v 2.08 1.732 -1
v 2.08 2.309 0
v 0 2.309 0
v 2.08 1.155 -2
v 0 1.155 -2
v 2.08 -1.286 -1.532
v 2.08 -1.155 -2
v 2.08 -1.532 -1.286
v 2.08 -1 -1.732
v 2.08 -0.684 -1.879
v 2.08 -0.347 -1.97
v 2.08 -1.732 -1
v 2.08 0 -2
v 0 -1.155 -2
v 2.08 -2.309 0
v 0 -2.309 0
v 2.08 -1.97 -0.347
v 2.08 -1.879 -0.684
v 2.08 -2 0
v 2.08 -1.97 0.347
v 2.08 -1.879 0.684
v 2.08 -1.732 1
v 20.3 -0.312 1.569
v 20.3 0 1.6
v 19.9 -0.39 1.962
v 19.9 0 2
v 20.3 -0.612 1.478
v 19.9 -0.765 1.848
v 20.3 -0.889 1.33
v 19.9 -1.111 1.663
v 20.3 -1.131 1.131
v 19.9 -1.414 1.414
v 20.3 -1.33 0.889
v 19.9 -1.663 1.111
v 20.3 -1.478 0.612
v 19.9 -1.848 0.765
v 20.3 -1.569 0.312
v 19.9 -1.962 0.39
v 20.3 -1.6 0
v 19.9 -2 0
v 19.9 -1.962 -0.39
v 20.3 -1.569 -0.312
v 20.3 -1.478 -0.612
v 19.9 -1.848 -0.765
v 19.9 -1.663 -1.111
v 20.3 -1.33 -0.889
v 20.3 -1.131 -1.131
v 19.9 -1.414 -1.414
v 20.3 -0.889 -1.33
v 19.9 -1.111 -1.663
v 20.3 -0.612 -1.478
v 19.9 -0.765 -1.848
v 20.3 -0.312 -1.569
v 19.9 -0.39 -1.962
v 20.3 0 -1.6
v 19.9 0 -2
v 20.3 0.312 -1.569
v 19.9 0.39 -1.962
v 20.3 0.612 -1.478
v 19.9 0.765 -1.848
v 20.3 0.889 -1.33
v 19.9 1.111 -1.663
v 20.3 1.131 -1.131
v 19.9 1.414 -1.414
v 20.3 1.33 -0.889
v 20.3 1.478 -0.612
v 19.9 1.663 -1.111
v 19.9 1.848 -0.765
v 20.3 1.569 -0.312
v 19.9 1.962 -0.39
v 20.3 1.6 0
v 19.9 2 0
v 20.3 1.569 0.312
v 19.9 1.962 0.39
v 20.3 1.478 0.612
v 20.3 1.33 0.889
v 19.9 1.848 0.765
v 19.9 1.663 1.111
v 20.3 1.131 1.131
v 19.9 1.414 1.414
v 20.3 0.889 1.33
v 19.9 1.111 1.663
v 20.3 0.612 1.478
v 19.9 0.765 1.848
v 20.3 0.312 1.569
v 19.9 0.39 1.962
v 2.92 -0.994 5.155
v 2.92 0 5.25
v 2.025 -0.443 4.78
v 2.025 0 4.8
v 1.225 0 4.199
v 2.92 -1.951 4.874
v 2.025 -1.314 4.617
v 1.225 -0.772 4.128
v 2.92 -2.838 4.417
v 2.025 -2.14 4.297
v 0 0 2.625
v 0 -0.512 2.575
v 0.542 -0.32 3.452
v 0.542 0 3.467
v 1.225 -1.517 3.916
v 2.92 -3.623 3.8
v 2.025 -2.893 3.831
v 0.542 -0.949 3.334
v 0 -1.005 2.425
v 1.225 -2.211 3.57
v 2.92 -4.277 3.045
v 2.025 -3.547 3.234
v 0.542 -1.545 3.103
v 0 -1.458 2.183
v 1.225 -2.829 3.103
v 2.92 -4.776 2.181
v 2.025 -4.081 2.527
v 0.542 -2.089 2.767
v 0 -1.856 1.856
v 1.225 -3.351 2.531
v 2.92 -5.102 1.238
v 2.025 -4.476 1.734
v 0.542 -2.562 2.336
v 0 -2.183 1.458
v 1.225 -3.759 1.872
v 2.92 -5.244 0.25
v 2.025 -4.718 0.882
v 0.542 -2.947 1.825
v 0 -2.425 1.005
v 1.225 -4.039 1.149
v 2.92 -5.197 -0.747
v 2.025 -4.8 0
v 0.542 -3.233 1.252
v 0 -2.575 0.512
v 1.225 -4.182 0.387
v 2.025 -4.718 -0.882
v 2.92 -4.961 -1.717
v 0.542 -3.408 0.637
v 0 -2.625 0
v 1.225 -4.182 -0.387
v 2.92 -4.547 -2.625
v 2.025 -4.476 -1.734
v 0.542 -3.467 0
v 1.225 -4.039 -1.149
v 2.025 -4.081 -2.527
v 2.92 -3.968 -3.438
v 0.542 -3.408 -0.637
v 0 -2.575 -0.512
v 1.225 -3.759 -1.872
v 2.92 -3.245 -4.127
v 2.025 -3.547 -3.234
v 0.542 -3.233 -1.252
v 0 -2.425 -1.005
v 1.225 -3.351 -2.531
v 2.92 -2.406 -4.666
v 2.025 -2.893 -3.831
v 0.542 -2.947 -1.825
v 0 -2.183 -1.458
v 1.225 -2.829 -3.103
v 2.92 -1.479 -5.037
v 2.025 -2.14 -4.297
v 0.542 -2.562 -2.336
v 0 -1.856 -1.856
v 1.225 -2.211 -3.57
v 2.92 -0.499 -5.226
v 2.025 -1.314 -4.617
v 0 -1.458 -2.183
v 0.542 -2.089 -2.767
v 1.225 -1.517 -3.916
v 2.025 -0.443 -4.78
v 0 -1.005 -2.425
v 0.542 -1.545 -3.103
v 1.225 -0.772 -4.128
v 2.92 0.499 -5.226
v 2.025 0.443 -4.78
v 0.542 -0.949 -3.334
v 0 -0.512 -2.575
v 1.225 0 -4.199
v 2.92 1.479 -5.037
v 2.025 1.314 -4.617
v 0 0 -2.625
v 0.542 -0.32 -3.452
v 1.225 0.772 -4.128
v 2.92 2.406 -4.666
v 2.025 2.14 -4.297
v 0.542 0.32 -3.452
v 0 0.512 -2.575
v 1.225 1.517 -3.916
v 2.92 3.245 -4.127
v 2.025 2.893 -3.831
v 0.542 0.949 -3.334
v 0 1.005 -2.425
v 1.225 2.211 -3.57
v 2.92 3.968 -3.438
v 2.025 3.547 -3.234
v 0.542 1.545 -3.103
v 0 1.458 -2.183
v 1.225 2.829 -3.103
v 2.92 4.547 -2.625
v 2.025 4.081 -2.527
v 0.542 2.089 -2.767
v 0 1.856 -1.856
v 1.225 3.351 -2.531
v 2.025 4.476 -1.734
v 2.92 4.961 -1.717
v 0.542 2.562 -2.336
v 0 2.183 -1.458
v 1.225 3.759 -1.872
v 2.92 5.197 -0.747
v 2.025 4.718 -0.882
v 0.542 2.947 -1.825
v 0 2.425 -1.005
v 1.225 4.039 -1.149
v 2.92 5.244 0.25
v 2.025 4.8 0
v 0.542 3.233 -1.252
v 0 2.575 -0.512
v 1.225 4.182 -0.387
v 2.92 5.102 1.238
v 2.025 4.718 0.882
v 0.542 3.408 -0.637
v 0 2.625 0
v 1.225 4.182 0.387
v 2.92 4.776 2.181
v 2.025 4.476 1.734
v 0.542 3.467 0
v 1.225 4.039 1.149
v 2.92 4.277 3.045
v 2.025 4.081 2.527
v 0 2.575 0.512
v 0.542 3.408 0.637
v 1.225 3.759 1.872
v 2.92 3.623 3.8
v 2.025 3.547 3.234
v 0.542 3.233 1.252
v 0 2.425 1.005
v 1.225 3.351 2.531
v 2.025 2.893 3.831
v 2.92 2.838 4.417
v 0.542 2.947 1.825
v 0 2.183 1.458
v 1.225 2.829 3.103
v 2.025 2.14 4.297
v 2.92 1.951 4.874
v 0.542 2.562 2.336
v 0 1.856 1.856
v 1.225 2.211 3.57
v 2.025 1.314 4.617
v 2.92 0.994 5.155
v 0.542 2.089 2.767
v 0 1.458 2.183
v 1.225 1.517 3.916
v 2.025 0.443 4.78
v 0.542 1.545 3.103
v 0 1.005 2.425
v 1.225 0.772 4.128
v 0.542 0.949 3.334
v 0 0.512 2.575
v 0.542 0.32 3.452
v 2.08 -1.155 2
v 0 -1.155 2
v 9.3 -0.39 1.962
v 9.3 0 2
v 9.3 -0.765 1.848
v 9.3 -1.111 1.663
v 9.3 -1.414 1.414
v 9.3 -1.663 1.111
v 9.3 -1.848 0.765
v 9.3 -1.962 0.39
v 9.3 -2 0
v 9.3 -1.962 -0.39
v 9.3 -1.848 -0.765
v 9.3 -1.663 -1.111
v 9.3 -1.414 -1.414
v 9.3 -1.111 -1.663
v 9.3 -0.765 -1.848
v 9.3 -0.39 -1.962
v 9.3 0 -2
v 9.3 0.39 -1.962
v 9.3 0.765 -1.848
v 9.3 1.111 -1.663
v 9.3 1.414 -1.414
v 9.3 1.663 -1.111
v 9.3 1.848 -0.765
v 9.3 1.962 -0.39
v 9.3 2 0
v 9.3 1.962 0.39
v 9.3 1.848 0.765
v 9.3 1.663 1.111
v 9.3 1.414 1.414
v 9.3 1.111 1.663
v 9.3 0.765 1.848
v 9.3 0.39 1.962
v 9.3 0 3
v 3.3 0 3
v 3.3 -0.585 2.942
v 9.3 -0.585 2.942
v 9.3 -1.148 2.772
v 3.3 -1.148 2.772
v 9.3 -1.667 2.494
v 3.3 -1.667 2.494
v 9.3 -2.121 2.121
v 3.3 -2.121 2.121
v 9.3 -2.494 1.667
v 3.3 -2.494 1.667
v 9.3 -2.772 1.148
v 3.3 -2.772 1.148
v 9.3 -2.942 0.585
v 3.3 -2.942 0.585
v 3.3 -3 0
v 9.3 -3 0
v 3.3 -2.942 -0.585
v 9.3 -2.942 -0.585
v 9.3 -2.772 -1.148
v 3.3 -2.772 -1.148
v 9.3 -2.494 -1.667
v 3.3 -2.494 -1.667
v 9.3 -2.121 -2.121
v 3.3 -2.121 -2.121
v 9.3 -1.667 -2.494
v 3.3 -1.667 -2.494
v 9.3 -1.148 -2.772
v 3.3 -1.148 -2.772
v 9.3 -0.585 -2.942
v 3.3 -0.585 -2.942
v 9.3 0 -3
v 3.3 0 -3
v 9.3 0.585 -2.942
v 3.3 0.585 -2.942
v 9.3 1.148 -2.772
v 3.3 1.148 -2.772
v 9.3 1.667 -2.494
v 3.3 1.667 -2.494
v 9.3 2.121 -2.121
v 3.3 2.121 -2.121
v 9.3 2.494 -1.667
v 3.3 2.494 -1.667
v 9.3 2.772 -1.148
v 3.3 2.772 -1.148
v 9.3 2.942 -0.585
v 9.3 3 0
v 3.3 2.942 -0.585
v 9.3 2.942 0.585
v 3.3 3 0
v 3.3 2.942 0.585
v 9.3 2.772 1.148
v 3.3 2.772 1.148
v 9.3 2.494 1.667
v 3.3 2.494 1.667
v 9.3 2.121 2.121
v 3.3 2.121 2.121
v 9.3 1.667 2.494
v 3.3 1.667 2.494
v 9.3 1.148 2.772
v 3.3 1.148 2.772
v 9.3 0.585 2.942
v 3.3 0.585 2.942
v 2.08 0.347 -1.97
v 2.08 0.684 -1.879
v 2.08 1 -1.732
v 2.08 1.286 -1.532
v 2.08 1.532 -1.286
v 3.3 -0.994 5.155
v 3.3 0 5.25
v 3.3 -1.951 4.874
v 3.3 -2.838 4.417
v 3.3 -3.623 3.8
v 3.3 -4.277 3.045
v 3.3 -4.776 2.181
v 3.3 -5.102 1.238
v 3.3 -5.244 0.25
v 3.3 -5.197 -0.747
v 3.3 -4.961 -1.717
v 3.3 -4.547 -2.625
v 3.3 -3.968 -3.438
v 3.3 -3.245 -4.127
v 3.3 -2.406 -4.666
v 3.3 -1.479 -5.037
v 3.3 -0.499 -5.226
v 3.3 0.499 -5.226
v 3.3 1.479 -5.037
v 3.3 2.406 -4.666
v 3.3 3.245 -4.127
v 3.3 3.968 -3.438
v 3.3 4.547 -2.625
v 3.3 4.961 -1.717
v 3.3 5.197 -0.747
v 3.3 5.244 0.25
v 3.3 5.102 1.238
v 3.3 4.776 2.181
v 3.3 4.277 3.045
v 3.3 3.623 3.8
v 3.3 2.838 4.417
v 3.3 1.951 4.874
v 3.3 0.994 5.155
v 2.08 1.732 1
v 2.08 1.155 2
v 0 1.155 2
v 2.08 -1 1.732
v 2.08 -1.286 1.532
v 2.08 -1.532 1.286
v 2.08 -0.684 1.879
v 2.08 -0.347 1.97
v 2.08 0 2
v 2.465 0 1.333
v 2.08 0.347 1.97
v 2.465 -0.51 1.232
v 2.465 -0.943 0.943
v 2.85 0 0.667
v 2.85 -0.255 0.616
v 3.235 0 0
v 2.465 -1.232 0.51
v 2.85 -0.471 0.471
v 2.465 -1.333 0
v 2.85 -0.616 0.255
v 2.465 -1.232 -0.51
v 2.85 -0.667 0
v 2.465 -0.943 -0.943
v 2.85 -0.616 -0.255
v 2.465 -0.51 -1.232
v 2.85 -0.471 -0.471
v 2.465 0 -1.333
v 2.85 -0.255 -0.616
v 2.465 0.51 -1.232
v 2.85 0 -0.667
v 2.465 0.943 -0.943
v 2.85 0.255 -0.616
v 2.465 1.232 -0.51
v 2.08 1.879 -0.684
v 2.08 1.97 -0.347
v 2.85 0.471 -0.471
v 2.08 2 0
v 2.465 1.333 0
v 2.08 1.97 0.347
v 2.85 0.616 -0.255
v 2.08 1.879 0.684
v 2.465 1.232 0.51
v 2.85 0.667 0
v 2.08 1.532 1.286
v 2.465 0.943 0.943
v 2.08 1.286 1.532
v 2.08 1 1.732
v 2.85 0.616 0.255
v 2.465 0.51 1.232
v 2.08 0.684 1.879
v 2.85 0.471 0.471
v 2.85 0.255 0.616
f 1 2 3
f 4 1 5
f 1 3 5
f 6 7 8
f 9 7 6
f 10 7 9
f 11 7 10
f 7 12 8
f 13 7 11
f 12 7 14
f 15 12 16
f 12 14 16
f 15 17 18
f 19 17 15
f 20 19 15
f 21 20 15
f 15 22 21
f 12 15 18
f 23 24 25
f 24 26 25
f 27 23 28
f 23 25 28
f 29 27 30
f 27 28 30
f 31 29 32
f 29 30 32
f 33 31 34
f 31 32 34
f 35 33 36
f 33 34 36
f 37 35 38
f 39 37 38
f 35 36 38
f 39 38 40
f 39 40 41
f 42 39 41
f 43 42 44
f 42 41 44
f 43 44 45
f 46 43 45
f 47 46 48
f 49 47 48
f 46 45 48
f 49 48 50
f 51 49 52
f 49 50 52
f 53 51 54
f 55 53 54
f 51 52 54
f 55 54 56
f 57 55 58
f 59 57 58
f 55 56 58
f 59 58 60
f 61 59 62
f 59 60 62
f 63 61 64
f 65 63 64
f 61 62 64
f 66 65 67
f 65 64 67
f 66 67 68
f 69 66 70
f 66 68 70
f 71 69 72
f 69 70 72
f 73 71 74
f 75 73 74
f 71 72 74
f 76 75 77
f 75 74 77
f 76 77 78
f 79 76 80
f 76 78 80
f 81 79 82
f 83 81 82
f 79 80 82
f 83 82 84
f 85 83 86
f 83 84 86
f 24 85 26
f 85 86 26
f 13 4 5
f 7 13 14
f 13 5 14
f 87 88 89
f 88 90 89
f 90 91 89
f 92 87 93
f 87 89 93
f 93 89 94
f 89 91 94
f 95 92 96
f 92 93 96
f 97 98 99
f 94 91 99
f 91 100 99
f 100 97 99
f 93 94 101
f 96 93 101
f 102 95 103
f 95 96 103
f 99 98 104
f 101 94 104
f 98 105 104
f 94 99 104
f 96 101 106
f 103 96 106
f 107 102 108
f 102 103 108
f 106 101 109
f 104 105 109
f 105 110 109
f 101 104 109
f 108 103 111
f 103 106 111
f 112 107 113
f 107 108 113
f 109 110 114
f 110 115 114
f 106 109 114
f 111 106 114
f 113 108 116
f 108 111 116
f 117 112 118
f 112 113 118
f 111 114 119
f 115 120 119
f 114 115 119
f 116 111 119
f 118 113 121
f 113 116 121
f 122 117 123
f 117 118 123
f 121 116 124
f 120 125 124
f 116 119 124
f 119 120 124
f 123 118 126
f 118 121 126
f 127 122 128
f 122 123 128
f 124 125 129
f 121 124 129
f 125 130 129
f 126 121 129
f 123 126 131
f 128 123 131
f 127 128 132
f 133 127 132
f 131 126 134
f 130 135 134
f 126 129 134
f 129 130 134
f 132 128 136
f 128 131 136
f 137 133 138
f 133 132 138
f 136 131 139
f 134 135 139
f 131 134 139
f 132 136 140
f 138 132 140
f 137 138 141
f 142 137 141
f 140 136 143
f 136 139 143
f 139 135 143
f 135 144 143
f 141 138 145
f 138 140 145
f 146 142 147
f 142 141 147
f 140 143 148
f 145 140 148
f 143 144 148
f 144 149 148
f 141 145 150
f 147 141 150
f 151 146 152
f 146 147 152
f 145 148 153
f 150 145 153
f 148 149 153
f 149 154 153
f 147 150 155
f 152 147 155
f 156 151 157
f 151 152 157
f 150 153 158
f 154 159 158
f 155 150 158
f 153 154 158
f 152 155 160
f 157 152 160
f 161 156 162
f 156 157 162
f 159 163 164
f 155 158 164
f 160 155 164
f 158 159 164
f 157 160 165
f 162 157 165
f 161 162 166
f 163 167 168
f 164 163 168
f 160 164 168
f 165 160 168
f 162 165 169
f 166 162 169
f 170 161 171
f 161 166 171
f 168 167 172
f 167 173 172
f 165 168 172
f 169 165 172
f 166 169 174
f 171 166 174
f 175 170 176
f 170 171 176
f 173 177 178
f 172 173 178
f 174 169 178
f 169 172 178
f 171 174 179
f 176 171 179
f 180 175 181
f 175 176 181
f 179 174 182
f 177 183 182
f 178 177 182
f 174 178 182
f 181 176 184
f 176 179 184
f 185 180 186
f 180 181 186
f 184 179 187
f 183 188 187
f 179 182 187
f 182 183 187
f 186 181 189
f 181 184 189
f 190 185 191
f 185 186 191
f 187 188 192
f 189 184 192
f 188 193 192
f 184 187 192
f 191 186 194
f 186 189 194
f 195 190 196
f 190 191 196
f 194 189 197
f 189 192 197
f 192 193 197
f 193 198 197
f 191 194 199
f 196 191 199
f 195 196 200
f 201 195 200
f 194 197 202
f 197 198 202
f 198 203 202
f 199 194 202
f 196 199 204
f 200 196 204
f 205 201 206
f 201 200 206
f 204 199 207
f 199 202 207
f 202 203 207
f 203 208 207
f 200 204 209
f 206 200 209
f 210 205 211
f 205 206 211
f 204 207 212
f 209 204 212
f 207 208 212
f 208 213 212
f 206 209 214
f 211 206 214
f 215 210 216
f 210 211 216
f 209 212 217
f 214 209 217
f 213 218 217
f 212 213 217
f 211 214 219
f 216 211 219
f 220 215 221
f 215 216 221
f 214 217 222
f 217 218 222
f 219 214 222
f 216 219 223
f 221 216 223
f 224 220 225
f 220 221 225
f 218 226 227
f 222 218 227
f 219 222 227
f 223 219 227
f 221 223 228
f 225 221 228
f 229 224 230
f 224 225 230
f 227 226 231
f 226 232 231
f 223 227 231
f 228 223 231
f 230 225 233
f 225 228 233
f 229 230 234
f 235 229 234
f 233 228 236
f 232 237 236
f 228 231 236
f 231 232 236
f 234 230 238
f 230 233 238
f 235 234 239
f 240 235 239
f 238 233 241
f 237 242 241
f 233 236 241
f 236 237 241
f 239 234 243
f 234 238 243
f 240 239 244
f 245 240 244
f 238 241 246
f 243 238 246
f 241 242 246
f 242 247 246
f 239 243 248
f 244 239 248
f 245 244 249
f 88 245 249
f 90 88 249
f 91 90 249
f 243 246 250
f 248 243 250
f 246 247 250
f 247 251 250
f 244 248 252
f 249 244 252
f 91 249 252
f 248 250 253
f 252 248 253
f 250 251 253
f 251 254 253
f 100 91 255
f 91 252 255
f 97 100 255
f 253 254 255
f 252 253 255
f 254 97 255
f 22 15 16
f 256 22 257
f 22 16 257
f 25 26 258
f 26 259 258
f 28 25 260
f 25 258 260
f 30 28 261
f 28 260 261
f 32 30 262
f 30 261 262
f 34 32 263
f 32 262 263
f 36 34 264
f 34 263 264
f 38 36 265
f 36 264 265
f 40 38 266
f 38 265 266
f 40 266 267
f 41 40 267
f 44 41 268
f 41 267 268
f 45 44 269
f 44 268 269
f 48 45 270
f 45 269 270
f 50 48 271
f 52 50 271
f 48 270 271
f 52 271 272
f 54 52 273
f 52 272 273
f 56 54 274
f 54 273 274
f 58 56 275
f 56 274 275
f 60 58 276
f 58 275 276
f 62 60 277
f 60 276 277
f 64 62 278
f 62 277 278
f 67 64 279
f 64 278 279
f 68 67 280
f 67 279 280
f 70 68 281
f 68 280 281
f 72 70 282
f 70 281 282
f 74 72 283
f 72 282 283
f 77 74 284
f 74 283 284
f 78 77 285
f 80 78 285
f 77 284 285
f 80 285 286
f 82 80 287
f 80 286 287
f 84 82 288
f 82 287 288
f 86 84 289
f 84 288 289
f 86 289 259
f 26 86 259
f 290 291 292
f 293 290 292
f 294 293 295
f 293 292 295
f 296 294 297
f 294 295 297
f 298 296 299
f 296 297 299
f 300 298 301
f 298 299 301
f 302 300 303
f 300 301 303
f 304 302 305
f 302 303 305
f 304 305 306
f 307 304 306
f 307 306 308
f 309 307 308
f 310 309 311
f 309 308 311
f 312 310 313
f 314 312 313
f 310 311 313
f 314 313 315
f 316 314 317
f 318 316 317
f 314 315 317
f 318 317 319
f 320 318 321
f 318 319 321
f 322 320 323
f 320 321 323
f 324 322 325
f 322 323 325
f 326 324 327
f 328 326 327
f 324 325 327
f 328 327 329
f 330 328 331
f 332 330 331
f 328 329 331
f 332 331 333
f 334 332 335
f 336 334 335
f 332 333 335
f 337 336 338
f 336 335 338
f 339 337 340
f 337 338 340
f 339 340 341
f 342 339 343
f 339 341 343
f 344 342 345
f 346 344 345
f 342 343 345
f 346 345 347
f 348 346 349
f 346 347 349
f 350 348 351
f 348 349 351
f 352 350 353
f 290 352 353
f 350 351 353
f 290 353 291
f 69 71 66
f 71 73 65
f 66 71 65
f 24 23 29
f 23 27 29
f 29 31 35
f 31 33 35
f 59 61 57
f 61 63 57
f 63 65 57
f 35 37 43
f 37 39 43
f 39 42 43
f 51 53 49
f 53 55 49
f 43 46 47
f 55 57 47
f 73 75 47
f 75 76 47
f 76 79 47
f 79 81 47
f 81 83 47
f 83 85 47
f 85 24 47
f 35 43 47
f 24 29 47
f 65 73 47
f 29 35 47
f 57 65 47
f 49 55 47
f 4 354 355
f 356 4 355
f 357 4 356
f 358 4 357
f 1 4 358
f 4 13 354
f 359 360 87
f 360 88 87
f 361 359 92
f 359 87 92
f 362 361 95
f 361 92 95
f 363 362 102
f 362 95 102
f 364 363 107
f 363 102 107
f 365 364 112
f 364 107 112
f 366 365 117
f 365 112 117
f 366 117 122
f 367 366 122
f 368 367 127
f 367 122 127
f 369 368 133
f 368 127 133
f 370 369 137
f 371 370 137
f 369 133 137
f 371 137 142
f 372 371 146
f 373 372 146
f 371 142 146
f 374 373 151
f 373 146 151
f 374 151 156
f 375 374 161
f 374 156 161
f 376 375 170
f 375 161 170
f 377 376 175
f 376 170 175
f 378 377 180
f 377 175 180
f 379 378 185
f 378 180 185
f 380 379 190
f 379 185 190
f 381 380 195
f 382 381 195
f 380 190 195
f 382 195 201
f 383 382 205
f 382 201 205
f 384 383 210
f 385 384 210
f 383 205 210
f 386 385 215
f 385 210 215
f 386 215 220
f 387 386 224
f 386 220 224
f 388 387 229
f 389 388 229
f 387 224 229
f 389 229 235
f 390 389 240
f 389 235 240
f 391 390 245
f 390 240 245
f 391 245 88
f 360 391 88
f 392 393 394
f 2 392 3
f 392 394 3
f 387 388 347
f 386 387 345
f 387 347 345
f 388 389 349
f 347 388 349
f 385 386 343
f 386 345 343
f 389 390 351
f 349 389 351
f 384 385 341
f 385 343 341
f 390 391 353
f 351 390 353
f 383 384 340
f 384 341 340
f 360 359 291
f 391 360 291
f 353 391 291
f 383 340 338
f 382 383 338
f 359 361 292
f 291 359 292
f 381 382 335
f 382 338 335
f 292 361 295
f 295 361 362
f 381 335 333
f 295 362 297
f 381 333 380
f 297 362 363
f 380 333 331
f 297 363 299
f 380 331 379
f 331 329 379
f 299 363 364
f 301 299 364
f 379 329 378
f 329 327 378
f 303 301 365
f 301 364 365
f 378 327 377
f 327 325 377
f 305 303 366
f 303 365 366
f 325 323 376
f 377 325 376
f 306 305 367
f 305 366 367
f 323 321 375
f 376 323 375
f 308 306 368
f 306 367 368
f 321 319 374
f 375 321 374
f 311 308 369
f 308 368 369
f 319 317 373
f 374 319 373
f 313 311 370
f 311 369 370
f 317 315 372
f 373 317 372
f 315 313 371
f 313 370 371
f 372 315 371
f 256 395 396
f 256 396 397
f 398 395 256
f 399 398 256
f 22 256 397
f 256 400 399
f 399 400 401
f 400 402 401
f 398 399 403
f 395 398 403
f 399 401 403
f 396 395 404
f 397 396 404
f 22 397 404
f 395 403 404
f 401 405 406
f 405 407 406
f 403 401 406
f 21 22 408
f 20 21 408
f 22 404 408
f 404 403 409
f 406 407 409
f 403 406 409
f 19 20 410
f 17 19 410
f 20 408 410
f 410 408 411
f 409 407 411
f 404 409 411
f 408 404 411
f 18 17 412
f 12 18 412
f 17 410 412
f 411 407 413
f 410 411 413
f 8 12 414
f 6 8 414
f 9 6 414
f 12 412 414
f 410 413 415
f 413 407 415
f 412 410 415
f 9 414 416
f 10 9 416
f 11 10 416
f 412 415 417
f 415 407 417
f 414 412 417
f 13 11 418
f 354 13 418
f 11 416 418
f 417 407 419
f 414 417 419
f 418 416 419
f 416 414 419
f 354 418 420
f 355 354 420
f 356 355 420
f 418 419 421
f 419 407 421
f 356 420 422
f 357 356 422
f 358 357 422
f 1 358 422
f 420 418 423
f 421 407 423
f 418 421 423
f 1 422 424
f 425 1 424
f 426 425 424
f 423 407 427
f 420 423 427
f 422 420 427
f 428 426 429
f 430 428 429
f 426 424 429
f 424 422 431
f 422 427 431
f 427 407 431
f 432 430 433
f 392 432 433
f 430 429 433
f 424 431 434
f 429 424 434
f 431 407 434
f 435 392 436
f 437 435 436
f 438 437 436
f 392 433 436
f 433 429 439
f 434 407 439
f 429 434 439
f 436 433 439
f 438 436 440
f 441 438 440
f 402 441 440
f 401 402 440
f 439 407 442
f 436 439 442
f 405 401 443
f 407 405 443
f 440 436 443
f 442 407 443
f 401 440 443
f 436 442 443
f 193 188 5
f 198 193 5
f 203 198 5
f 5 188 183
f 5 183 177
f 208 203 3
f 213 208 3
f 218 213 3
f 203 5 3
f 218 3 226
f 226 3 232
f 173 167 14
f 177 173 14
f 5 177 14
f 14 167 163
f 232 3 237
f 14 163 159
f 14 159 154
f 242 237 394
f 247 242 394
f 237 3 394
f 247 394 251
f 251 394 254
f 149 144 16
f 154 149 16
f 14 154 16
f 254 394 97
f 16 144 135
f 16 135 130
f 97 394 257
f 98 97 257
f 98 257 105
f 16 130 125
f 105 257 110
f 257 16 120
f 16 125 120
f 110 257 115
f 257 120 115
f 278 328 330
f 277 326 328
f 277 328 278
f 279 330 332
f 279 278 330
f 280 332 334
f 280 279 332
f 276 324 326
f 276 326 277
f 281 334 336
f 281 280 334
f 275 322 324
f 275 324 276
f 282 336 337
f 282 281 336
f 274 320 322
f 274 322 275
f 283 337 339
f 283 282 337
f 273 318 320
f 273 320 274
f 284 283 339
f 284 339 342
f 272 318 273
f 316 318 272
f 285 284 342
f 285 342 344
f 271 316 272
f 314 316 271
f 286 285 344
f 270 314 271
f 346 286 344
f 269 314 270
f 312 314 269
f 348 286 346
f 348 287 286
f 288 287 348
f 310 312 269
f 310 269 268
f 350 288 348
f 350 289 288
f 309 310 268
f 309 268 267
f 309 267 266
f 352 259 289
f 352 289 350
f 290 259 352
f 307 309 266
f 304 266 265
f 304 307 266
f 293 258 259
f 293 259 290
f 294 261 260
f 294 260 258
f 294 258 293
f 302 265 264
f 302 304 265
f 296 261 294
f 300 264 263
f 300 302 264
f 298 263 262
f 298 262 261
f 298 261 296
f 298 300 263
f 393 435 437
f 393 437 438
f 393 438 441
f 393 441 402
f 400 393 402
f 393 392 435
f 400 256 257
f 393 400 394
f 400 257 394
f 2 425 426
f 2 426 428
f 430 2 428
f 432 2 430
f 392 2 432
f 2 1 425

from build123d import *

# Parameters (mm, degrees)
FILLET1_R                = 0.01
HEX_2_DEPTH              = 2.08
ESBO_O1_R                = 3
RESSALTO_EXTRUS_O1_DEPTH = 6


with BuildPart() as part:
    # BodySke → BaseBody (revolve)
    with BuildSketch(Plane.XY, mode=Mode.PRIVATE) as basebody_sk:
        with BuildLine():
            Line((20.3, 0), (20.3, 1.6))
            Line((20.3, 1.6), (19.9, 2))
            Line((19.9, 2), (3.3, 2))
            Line((3.3, 2), (3.3, 5.25))
            Line((3.3, 5.25), (2.92, 5.25))
            ThreePointArc((2.92, 5.25), (1.224500646, 4.199464996), (0, 2.625))
            Line((0, 2.625), (0, 0))
            Line((0, 0), (20.3, 0))
        make_face()
    revolve(basebody_sk.sketch.rotate(Axis((0, 0, 0), (1, 0, 0)), 90), axis=Axis((0, 0, 0), (1, 0, 0)))

    # Fillet1
    fillet1_edges = [part.edges().sort_by_distance(p)[0] for p in [
        (3.3, 0, -2),
    ]]
    fillet(fillet1_edges, radius=FILLET1_R)

    # Sketch2 → PreBroach (revolve, cut)
    with BuildSketch(Plane.XY, mode=Mode.PRIVATE) as prebroach_sk:
        Polygon((0, 2), (2.08, 2), (3.234700538, 0), (0, 0), align=None)
    revolve(prebroach_sk.sketch.rotate(Axis((0, 0, 0), (1, 0, 0)), 90), axis=Axis((0, 0, 0), (1, 0, 0)), mode=Mode.SUBTRACT)

    # Sketch3 → Hex 2 (cut)
    with BuildSketch(Plane(origin=(0, 0, 0), x_dir=(0, 0, -1), z_dir=(1, 0, 0))):
        Polygon((-2, -1.154700538), (-2, 1.154700538), (0, 2.309401077), (2, 1.154700538), (2, -1.154700538), (0, -2.309401077), align=None)
    extrude(amount=HEX_2_DEPTH, mode=Mode.SUBTRACT)

    # Esboço1 → Ressalto-extrusão1 (add)
    with BuildSketch(Plane(origin=(3.3, 0, 0), x_dir=(0, 0, -1), z_dir=(1, 0, 0))):
        with Locations(Location((0, 0, 0), (0, 0, 180))):
            Circle(ESBO_O1_R)
    extrude(amount=RESSALTO_EXTRUS_O1_DEPTH)


solid = part.part
